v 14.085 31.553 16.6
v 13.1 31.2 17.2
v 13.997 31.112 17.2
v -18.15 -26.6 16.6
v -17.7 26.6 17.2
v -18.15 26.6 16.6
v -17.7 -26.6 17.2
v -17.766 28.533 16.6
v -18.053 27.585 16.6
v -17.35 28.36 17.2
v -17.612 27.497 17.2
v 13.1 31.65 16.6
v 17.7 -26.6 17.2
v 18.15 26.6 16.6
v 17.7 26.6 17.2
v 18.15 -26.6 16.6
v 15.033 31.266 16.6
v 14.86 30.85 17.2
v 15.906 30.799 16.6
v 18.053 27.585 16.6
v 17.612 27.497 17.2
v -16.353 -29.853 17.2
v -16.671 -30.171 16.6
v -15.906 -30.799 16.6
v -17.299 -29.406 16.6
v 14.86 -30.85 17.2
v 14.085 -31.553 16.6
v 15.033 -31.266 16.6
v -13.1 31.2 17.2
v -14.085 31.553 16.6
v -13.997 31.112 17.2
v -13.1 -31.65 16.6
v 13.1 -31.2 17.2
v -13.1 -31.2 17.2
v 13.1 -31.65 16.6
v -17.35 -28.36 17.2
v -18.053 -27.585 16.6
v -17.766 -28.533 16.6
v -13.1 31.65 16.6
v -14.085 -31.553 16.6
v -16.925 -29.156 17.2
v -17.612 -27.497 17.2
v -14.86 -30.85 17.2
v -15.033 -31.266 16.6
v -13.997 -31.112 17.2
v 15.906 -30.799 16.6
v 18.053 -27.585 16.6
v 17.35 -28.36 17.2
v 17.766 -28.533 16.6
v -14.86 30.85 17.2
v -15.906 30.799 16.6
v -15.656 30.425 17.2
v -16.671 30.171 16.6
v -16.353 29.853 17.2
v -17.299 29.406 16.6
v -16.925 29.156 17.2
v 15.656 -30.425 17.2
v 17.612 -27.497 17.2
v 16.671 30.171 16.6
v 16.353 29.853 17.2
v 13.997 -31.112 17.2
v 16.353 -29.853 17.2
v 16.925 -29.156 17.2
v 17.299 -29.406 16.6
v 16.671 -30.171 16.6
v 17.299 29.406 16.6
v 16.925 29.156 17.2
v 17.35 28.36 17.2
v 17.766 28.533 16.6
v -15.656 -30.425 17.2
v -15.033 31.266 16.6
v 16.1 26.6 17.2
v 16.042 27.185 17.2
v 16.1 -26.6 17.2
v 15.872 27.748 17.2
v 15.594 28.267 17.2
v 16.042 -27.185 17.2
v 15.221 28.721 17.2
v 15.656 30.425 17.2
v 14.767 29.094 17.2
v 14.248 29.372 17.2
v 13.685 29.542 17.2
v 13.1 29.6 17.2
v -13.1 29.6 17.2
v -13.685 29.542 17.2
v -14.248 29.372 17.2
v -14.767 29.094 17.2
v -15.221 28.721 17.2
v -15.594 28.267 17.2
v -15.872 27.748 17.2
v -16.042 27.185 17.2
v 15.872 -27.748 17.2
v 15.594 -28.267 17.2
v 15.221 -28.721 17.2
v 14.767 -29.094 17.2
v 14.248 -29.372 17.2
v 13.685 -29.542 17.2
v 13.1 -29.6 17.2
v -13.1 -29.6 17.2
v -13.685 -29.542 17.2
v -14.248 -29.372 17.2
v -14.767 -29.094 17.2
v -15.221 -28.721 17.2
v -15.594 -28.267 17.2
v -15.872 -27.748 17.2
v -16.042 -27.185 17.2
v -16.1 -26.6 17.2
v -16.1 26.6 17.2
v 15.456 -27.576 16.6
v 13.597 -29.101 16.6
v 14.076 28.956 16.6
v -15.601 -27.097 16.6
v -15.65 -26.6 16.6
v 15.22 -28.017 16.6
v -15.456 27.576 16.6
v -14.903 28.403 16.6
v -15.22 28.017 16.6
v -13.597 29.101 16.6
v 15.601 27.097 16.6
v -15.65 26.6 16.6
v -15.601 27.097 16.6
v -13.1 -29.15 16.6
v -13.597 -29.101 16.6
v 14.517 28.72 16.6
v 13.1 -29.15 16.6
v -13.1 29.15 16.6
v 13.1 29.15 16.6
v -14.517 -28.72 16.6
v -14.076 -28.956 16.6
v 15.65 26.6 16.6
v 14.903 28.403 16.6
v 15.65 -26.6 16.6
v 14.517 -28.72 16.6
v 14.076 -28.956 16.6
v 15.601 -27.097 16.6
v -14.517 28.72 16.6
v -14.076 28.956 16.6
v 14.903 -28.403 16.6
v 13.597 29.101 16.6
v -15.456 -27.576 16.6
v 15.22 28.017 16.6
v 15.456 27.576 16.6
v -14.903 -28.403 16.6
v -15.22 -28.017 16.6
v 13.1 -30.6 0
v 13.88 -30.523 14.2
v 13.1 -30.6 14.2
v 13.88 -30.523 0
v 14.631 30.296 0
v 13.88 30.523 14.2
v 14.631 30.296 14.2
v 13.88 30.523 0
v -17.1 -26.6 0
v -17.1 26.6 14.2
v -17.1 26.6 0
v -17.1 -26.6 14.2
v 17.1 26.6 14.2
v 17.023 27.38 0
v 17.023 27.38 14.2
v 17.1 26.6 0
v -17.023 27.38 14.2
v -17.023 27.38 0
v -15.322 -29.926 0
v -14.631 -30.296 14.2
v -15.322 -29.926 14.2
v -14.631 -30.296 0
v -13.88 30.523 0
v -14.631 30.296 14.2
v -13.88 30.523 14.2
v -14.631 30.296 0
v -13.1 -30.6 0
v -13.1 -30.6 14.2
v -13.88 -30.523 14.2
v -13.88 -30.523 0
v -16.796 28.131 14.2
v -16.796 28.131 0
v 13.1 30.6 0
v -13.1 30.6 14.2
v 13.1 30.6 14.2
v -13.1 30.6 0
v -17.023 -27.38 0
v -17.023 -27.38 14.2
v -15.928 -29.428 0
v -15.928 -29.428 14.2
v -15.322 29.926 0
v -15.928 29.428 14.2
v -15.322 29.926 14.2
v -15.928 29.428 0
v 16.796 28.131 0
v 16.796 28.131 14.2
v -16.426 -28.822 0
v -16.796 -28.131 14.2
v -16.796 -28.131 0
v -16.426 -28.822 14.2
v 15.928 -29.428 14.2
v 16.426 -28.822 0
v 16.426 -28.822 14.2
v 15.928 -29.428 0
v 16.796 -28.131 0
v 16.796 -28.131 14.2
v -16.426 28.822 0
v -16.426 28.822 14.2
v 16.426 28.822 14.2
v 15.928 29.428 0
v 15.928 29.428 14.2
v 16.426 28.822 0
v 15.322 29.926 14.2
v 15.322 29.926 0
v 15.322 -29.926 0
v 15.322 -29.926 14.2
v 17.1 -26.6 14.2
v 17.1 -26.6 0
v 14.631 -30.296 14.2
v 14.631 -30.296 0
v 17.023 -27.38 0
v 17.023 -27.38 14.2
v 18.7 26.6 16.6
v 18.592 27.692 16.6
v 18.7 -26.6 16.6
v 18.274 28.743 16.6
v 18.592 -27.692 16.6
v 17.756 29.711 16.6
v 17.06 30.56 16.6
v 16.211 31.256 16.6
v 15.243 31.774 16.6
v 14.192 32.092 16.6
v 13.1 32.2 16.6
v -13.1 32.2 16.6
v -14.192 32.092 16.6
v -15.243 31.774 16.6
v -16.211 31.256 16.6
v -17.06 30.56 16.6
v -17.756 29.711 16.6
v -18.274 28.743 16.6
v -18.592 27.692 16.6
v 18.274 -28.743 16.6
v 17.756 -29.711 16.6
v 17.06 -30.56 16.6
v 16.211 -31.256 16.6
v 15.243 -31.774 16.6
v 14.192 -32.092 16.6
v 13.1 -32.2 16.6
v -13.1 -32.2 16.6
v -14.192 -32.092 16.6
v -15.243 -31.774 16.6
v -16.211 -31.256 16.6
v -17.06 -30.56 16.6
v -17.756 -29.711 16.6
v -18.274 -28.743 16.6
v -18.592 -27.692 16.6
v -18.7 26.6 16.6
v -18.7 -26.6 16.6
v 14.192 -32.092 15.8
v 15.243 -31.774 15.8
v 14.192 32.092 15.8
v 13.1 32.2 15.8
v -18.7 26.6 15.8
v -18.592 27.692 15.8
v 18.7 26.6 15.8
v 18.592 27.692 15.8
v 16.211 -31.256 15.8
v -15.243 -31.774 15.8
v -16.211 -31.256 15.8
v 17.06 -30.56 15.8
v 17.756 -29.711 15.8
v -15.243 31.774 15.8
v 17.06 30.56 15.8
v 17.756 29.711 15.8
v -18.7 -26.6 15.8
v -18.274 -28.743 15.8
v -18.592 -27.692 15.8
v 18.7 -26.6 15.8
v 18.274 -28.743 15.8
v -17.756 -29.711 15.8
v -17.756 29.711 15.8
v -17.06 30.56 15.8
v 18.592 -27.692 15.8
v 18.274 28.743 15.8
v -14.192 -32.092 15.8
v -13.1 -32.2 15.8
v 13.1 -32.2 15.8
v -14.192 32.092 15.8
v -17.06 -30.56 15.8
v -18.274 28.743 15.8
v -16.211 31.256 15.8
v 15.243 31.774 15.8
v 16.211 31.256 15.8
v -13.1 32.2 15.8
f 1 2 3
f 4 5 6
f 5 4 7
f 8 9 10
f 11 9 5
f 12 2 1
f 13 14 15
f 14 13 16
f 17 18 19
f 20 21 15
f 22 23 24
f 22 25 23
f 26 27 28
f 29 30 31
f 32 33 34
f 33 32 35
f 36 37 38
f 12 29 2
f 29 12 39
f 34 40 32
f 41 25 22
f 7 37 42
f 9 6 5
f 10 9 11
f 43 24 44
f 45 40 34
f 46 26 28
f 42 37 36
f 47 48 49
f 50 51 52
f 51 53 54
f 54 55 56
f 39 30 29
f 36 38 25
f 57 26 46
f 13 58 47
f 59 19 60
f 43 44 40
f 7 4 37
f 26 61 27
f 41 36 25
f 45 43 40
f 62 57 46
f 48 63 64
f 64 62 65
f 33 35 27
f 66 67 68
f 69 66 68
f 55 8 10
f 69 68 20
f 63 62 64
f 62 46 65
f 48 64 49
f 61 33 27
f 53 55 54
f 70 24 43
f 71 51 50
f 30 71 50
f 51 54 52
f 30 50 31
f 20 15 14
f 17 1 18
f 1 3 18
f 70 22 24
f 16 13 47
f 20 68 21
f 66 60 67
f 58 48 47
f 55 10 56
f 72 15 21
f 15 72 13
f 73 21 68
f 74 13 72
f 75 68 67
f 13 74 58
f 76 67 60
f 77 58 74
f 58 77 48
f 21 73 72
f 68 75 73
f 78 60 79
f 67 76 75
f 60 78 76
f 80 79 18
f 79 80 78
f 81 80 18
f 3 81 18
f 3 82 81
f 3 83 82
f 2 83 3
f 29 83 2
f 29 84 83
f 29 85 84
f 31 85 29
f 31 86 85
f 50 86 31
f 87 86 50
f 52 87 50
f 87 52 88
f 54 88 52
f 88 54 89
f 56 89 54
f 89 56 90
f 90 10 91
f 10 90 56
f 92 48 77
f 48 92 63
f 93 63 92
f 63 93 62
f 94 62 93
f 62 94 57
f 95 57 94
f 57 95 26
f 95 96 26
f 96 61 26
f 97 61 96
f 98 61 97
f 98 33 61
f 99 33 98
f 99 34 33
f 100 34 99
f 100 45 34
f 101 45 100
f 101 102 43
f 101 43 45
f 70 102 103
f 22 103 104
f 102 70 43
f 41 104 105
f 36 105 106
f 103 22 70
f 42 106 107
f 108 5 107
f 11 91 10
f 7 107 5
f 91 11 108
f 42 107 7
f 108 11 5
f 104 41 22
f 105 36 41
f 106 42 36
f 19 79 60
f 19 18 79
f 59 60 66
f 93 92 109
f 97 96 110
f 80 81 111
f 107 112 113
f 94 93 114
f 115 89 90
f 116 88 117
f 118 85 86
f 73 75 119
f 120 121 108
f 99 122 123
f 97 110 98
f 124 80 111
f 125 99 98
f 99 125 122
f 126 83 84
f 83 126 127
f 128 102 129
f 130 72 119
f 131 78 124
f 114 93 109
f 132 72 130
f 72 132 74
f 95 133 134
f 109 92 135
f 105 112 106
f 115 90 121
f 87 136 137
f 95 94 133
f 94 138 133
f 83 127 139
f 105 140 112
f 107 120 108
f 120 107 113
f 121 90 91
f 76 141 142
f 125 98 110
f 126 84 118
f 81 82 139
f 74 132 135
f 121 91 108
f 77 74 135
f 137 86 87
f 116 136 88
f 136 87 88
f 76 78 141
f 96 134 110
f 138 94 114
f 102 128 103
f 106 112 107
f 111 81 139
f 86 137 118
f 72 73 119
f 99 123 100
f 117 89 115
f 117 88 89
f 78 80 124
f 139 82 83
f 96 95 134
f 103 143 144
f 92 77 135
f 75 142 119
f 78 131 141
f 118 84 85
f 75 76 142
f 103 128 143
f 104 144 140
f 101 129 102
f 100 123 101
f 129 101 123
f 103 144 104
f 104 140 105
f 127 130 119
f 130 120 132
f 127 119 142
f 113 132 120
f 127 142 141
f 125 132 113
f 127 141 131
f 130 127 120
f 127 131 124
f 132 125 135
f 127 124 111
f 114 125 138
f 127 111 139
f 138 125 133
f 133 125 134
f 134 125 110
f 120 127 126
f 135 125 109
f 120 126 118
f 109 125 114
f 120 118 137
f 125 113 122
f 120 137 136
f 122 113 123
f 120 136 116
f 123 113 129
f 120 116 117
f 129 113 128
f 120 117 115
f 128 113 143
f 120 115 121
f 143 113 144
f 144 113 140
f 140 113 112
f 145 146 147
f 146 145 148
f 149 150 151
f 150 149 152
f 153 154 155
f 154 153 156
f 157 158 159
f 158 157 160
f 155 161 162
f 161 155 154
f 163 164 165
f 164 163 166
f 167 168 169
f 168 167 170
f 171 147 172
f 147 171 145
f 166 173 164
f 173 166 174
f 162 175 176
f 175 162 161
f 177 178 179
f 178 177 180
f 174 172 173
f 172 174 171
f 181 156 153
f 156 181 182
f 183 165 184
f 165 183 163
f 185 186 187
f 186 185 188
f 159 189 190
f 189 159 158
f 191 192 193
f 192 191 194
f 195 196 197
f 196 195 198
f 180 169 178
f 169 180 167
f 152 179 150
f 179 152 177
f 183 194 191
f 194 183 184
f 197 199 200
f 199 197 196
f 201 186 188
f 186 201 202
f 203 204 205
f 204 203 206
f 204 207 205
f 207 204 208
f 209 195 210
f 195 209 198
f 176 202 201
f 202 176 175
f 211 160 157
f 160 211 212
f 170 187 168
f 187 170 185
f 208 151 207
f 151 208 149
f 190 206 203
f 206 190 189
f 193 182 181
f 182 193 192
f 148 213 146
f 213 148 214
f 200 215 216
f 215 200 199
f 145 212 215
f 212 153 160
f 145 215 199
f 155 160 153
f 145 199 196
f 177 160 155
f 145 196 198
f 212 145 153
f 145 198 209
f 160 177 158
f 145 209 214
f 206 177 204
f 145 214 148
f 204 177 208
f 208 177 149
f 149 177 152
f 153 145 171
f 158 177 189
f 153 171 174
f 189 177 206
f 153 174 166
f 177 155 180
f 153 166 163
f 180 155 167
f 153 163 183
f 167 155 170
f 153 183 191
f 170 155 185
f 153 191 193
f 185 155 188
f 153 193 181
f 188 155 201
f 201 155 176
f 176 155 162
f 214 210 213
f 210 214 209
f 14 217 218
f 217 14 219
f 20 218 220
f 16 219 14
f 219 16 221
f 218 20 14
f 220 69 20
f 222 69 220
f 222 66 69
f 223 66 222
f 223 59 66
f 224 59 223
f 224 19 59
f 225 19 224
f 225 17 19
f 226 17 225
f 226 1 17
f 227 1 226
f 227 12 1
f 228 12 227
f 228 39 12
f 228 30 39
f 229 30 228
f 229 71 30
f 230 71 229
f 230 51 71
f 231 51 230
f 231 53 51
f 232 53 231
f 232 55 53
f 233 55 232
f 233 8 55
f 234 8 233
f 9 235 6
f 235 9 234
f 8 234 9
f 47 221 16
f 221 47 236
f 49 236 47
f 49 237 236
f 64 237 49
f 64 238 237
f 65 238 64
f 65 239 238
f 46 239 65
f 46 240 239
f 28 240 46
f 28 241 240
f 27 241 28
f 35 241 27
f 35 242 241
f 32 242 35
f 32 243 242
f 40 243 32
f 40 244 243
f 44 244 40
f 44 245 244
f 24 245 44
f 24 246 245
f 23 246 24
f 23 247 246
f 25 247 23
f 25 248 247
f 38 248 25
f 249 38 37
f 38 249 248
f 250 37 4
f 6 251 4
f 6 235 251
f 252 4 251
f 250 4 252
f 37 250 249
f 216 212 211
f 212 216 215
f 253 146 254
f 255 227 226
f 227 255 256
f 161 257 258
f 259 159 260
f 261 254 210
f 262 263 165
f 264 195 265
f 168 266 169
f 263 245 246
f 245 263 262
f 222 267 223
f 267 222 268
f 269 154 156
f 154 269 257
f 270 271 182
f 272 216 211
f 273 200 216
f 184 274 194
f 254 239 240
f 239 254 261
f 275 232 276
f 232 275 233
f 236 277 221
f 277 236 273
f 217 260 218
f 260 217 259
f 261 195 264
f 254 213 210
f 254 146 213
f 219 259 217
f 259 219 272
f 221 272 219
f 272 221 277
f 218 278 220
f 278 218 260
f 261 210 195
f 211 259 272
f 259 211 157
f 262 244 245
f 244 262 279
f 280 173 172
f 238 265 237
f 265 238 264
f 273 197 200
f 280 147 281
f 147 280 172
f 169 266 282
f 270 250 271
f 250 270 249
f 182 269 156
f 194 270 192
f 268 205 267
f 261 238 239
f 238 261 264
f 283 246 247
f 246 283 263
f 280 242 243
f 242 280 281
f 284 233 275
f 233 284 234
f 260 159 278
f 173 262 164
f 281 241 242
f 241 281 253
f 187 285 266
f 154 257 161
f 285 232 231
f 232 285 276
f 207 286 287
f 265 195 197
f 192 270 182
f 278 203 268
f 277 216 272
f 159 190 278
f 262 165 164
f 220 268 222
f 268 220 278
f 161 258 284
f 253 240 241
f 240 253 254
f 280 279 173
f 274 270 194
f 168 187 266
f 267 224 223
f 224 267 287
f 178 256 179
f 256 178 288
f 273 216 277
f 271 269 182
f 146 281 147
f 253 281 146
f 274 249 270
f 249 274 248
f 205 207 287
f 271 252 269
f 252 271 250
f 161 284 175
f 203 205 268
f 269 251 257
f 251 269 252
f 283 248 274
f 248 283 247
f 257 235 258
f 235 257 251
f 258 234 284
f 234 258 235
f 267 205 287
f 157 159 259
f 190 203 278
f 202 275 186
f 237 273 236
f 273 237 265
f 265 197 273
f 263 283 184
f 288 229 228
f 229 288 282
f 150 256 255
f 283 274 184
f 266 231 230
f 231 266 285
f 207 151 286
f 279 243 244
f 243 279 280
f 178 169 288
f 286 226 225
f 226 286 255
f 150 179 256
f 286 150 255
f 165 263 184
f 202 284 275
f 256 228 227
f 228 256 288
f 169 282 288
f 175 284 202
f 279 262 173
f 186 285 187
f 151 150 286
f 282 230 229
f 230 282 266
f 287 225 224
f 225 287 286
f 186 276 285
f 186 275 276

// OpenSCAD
// [Type:enum] [Options:case|lid|hinge|lock-hinge|lock-left|lock-right|seal]
part = "lid";

// [Minimum:1 Maximum:300 Step:0.1] [Desciption: The inner length of the box in the x direction]
inner_x = 30.2;

// [Minimum:1 Maximum:300 Step:0.1] [Desciption: The inner length of the box in the y direction]
inner_y = 57.2;

// [Minimum:1 Maximum:200 Step:0.1] [Desciption: The inner height of the box]
case_inner_z = 87.0;

// [Minimum:1 Maximum:50 Step:0.1] [Desciption: The inner height of the lid]
lid_inner_z = 15.0;

// [Minimum:1 Maximum:20 Step:0.1] [Desciption: The radius of the rounding of the inside of the box]
inner_r = 2.0;

// [Minimum:0.4 Maximum:10 Step:0.1] [Desciption: Thickness of the walls of the box]
wall_thickness = 2.4;

// [Type:bool] [Desciption: Whether or not to enable seal (should be printed with a flexible material such as TPU)]
seal_enable = true;

// [Minimum:0 Maximum:5 Step:1] [Desciption: Number of hinges]
n_hinges = 2;

// [Minimum:10 Maximum:30 Step:1] [Desciption: Length of the M3 screws used by the hinges]
hinge_screw_length = 20;

// [Minimum:0 Maximum:1 Step:0.01] [Desciption: Increasing this value makes the hinges more tight. It is the amount the hinges are made to short in mm]
hinge_spacing_adjustment = 0.15;

// [Minimum:0 Maximum:5 Step:1] [Desciption: Number of locks]
n_locks = 2;

// [Minimum:15 Maximum:35 Step:1] [Desciption: Length of the M3 screws used by the locks]
lock_screw_length = 25;

// [Minimum:0 Maximum:1 Step:0.01] [Desciption: Increasing this value makes the locks more tight. It is the amount the lock sides are made to short in mm]
lock_spacing_adjustment = 0.20;

// [Minimum:5 Maximum:25 Step:0.5] [Desciption: Increasing the angle of the hinge lock makes the lock more "clicky"]
lock_hinge_angle = 15;

// [Type:text]
lid_text = "";

// [Type:text]
case_bottom_text = "";

case_text = "V0.9";
font_size = 11;


$fn = 32;

use <rugged-case-library.scad>;

if (part == "case")
    ruggedCase(inner_x, inner_y, case_inner_z, inner_r = inner_r, n_hinges = n_hinges, n_locks = n_locks,
               bottom_text = case_bottom_text, font_size = font_size, text_rotate = 90);
if (part == "lid")
    ruggedLid(inner_x, inner_y, lid_inner_z, inner_r = inner_r);
if (part == "hinge")
    hinge();
if (part == "lock-hinge")
    lockHinge();
if (part == "lock-left")
    lockHinge();
if (part == "lock-right")
    mirror([0,1,0]) lockHinge();
if (part == "seal")
    seal(seal_width, seal_height, seal_wall, inner_x, inner_y, inner_r);
